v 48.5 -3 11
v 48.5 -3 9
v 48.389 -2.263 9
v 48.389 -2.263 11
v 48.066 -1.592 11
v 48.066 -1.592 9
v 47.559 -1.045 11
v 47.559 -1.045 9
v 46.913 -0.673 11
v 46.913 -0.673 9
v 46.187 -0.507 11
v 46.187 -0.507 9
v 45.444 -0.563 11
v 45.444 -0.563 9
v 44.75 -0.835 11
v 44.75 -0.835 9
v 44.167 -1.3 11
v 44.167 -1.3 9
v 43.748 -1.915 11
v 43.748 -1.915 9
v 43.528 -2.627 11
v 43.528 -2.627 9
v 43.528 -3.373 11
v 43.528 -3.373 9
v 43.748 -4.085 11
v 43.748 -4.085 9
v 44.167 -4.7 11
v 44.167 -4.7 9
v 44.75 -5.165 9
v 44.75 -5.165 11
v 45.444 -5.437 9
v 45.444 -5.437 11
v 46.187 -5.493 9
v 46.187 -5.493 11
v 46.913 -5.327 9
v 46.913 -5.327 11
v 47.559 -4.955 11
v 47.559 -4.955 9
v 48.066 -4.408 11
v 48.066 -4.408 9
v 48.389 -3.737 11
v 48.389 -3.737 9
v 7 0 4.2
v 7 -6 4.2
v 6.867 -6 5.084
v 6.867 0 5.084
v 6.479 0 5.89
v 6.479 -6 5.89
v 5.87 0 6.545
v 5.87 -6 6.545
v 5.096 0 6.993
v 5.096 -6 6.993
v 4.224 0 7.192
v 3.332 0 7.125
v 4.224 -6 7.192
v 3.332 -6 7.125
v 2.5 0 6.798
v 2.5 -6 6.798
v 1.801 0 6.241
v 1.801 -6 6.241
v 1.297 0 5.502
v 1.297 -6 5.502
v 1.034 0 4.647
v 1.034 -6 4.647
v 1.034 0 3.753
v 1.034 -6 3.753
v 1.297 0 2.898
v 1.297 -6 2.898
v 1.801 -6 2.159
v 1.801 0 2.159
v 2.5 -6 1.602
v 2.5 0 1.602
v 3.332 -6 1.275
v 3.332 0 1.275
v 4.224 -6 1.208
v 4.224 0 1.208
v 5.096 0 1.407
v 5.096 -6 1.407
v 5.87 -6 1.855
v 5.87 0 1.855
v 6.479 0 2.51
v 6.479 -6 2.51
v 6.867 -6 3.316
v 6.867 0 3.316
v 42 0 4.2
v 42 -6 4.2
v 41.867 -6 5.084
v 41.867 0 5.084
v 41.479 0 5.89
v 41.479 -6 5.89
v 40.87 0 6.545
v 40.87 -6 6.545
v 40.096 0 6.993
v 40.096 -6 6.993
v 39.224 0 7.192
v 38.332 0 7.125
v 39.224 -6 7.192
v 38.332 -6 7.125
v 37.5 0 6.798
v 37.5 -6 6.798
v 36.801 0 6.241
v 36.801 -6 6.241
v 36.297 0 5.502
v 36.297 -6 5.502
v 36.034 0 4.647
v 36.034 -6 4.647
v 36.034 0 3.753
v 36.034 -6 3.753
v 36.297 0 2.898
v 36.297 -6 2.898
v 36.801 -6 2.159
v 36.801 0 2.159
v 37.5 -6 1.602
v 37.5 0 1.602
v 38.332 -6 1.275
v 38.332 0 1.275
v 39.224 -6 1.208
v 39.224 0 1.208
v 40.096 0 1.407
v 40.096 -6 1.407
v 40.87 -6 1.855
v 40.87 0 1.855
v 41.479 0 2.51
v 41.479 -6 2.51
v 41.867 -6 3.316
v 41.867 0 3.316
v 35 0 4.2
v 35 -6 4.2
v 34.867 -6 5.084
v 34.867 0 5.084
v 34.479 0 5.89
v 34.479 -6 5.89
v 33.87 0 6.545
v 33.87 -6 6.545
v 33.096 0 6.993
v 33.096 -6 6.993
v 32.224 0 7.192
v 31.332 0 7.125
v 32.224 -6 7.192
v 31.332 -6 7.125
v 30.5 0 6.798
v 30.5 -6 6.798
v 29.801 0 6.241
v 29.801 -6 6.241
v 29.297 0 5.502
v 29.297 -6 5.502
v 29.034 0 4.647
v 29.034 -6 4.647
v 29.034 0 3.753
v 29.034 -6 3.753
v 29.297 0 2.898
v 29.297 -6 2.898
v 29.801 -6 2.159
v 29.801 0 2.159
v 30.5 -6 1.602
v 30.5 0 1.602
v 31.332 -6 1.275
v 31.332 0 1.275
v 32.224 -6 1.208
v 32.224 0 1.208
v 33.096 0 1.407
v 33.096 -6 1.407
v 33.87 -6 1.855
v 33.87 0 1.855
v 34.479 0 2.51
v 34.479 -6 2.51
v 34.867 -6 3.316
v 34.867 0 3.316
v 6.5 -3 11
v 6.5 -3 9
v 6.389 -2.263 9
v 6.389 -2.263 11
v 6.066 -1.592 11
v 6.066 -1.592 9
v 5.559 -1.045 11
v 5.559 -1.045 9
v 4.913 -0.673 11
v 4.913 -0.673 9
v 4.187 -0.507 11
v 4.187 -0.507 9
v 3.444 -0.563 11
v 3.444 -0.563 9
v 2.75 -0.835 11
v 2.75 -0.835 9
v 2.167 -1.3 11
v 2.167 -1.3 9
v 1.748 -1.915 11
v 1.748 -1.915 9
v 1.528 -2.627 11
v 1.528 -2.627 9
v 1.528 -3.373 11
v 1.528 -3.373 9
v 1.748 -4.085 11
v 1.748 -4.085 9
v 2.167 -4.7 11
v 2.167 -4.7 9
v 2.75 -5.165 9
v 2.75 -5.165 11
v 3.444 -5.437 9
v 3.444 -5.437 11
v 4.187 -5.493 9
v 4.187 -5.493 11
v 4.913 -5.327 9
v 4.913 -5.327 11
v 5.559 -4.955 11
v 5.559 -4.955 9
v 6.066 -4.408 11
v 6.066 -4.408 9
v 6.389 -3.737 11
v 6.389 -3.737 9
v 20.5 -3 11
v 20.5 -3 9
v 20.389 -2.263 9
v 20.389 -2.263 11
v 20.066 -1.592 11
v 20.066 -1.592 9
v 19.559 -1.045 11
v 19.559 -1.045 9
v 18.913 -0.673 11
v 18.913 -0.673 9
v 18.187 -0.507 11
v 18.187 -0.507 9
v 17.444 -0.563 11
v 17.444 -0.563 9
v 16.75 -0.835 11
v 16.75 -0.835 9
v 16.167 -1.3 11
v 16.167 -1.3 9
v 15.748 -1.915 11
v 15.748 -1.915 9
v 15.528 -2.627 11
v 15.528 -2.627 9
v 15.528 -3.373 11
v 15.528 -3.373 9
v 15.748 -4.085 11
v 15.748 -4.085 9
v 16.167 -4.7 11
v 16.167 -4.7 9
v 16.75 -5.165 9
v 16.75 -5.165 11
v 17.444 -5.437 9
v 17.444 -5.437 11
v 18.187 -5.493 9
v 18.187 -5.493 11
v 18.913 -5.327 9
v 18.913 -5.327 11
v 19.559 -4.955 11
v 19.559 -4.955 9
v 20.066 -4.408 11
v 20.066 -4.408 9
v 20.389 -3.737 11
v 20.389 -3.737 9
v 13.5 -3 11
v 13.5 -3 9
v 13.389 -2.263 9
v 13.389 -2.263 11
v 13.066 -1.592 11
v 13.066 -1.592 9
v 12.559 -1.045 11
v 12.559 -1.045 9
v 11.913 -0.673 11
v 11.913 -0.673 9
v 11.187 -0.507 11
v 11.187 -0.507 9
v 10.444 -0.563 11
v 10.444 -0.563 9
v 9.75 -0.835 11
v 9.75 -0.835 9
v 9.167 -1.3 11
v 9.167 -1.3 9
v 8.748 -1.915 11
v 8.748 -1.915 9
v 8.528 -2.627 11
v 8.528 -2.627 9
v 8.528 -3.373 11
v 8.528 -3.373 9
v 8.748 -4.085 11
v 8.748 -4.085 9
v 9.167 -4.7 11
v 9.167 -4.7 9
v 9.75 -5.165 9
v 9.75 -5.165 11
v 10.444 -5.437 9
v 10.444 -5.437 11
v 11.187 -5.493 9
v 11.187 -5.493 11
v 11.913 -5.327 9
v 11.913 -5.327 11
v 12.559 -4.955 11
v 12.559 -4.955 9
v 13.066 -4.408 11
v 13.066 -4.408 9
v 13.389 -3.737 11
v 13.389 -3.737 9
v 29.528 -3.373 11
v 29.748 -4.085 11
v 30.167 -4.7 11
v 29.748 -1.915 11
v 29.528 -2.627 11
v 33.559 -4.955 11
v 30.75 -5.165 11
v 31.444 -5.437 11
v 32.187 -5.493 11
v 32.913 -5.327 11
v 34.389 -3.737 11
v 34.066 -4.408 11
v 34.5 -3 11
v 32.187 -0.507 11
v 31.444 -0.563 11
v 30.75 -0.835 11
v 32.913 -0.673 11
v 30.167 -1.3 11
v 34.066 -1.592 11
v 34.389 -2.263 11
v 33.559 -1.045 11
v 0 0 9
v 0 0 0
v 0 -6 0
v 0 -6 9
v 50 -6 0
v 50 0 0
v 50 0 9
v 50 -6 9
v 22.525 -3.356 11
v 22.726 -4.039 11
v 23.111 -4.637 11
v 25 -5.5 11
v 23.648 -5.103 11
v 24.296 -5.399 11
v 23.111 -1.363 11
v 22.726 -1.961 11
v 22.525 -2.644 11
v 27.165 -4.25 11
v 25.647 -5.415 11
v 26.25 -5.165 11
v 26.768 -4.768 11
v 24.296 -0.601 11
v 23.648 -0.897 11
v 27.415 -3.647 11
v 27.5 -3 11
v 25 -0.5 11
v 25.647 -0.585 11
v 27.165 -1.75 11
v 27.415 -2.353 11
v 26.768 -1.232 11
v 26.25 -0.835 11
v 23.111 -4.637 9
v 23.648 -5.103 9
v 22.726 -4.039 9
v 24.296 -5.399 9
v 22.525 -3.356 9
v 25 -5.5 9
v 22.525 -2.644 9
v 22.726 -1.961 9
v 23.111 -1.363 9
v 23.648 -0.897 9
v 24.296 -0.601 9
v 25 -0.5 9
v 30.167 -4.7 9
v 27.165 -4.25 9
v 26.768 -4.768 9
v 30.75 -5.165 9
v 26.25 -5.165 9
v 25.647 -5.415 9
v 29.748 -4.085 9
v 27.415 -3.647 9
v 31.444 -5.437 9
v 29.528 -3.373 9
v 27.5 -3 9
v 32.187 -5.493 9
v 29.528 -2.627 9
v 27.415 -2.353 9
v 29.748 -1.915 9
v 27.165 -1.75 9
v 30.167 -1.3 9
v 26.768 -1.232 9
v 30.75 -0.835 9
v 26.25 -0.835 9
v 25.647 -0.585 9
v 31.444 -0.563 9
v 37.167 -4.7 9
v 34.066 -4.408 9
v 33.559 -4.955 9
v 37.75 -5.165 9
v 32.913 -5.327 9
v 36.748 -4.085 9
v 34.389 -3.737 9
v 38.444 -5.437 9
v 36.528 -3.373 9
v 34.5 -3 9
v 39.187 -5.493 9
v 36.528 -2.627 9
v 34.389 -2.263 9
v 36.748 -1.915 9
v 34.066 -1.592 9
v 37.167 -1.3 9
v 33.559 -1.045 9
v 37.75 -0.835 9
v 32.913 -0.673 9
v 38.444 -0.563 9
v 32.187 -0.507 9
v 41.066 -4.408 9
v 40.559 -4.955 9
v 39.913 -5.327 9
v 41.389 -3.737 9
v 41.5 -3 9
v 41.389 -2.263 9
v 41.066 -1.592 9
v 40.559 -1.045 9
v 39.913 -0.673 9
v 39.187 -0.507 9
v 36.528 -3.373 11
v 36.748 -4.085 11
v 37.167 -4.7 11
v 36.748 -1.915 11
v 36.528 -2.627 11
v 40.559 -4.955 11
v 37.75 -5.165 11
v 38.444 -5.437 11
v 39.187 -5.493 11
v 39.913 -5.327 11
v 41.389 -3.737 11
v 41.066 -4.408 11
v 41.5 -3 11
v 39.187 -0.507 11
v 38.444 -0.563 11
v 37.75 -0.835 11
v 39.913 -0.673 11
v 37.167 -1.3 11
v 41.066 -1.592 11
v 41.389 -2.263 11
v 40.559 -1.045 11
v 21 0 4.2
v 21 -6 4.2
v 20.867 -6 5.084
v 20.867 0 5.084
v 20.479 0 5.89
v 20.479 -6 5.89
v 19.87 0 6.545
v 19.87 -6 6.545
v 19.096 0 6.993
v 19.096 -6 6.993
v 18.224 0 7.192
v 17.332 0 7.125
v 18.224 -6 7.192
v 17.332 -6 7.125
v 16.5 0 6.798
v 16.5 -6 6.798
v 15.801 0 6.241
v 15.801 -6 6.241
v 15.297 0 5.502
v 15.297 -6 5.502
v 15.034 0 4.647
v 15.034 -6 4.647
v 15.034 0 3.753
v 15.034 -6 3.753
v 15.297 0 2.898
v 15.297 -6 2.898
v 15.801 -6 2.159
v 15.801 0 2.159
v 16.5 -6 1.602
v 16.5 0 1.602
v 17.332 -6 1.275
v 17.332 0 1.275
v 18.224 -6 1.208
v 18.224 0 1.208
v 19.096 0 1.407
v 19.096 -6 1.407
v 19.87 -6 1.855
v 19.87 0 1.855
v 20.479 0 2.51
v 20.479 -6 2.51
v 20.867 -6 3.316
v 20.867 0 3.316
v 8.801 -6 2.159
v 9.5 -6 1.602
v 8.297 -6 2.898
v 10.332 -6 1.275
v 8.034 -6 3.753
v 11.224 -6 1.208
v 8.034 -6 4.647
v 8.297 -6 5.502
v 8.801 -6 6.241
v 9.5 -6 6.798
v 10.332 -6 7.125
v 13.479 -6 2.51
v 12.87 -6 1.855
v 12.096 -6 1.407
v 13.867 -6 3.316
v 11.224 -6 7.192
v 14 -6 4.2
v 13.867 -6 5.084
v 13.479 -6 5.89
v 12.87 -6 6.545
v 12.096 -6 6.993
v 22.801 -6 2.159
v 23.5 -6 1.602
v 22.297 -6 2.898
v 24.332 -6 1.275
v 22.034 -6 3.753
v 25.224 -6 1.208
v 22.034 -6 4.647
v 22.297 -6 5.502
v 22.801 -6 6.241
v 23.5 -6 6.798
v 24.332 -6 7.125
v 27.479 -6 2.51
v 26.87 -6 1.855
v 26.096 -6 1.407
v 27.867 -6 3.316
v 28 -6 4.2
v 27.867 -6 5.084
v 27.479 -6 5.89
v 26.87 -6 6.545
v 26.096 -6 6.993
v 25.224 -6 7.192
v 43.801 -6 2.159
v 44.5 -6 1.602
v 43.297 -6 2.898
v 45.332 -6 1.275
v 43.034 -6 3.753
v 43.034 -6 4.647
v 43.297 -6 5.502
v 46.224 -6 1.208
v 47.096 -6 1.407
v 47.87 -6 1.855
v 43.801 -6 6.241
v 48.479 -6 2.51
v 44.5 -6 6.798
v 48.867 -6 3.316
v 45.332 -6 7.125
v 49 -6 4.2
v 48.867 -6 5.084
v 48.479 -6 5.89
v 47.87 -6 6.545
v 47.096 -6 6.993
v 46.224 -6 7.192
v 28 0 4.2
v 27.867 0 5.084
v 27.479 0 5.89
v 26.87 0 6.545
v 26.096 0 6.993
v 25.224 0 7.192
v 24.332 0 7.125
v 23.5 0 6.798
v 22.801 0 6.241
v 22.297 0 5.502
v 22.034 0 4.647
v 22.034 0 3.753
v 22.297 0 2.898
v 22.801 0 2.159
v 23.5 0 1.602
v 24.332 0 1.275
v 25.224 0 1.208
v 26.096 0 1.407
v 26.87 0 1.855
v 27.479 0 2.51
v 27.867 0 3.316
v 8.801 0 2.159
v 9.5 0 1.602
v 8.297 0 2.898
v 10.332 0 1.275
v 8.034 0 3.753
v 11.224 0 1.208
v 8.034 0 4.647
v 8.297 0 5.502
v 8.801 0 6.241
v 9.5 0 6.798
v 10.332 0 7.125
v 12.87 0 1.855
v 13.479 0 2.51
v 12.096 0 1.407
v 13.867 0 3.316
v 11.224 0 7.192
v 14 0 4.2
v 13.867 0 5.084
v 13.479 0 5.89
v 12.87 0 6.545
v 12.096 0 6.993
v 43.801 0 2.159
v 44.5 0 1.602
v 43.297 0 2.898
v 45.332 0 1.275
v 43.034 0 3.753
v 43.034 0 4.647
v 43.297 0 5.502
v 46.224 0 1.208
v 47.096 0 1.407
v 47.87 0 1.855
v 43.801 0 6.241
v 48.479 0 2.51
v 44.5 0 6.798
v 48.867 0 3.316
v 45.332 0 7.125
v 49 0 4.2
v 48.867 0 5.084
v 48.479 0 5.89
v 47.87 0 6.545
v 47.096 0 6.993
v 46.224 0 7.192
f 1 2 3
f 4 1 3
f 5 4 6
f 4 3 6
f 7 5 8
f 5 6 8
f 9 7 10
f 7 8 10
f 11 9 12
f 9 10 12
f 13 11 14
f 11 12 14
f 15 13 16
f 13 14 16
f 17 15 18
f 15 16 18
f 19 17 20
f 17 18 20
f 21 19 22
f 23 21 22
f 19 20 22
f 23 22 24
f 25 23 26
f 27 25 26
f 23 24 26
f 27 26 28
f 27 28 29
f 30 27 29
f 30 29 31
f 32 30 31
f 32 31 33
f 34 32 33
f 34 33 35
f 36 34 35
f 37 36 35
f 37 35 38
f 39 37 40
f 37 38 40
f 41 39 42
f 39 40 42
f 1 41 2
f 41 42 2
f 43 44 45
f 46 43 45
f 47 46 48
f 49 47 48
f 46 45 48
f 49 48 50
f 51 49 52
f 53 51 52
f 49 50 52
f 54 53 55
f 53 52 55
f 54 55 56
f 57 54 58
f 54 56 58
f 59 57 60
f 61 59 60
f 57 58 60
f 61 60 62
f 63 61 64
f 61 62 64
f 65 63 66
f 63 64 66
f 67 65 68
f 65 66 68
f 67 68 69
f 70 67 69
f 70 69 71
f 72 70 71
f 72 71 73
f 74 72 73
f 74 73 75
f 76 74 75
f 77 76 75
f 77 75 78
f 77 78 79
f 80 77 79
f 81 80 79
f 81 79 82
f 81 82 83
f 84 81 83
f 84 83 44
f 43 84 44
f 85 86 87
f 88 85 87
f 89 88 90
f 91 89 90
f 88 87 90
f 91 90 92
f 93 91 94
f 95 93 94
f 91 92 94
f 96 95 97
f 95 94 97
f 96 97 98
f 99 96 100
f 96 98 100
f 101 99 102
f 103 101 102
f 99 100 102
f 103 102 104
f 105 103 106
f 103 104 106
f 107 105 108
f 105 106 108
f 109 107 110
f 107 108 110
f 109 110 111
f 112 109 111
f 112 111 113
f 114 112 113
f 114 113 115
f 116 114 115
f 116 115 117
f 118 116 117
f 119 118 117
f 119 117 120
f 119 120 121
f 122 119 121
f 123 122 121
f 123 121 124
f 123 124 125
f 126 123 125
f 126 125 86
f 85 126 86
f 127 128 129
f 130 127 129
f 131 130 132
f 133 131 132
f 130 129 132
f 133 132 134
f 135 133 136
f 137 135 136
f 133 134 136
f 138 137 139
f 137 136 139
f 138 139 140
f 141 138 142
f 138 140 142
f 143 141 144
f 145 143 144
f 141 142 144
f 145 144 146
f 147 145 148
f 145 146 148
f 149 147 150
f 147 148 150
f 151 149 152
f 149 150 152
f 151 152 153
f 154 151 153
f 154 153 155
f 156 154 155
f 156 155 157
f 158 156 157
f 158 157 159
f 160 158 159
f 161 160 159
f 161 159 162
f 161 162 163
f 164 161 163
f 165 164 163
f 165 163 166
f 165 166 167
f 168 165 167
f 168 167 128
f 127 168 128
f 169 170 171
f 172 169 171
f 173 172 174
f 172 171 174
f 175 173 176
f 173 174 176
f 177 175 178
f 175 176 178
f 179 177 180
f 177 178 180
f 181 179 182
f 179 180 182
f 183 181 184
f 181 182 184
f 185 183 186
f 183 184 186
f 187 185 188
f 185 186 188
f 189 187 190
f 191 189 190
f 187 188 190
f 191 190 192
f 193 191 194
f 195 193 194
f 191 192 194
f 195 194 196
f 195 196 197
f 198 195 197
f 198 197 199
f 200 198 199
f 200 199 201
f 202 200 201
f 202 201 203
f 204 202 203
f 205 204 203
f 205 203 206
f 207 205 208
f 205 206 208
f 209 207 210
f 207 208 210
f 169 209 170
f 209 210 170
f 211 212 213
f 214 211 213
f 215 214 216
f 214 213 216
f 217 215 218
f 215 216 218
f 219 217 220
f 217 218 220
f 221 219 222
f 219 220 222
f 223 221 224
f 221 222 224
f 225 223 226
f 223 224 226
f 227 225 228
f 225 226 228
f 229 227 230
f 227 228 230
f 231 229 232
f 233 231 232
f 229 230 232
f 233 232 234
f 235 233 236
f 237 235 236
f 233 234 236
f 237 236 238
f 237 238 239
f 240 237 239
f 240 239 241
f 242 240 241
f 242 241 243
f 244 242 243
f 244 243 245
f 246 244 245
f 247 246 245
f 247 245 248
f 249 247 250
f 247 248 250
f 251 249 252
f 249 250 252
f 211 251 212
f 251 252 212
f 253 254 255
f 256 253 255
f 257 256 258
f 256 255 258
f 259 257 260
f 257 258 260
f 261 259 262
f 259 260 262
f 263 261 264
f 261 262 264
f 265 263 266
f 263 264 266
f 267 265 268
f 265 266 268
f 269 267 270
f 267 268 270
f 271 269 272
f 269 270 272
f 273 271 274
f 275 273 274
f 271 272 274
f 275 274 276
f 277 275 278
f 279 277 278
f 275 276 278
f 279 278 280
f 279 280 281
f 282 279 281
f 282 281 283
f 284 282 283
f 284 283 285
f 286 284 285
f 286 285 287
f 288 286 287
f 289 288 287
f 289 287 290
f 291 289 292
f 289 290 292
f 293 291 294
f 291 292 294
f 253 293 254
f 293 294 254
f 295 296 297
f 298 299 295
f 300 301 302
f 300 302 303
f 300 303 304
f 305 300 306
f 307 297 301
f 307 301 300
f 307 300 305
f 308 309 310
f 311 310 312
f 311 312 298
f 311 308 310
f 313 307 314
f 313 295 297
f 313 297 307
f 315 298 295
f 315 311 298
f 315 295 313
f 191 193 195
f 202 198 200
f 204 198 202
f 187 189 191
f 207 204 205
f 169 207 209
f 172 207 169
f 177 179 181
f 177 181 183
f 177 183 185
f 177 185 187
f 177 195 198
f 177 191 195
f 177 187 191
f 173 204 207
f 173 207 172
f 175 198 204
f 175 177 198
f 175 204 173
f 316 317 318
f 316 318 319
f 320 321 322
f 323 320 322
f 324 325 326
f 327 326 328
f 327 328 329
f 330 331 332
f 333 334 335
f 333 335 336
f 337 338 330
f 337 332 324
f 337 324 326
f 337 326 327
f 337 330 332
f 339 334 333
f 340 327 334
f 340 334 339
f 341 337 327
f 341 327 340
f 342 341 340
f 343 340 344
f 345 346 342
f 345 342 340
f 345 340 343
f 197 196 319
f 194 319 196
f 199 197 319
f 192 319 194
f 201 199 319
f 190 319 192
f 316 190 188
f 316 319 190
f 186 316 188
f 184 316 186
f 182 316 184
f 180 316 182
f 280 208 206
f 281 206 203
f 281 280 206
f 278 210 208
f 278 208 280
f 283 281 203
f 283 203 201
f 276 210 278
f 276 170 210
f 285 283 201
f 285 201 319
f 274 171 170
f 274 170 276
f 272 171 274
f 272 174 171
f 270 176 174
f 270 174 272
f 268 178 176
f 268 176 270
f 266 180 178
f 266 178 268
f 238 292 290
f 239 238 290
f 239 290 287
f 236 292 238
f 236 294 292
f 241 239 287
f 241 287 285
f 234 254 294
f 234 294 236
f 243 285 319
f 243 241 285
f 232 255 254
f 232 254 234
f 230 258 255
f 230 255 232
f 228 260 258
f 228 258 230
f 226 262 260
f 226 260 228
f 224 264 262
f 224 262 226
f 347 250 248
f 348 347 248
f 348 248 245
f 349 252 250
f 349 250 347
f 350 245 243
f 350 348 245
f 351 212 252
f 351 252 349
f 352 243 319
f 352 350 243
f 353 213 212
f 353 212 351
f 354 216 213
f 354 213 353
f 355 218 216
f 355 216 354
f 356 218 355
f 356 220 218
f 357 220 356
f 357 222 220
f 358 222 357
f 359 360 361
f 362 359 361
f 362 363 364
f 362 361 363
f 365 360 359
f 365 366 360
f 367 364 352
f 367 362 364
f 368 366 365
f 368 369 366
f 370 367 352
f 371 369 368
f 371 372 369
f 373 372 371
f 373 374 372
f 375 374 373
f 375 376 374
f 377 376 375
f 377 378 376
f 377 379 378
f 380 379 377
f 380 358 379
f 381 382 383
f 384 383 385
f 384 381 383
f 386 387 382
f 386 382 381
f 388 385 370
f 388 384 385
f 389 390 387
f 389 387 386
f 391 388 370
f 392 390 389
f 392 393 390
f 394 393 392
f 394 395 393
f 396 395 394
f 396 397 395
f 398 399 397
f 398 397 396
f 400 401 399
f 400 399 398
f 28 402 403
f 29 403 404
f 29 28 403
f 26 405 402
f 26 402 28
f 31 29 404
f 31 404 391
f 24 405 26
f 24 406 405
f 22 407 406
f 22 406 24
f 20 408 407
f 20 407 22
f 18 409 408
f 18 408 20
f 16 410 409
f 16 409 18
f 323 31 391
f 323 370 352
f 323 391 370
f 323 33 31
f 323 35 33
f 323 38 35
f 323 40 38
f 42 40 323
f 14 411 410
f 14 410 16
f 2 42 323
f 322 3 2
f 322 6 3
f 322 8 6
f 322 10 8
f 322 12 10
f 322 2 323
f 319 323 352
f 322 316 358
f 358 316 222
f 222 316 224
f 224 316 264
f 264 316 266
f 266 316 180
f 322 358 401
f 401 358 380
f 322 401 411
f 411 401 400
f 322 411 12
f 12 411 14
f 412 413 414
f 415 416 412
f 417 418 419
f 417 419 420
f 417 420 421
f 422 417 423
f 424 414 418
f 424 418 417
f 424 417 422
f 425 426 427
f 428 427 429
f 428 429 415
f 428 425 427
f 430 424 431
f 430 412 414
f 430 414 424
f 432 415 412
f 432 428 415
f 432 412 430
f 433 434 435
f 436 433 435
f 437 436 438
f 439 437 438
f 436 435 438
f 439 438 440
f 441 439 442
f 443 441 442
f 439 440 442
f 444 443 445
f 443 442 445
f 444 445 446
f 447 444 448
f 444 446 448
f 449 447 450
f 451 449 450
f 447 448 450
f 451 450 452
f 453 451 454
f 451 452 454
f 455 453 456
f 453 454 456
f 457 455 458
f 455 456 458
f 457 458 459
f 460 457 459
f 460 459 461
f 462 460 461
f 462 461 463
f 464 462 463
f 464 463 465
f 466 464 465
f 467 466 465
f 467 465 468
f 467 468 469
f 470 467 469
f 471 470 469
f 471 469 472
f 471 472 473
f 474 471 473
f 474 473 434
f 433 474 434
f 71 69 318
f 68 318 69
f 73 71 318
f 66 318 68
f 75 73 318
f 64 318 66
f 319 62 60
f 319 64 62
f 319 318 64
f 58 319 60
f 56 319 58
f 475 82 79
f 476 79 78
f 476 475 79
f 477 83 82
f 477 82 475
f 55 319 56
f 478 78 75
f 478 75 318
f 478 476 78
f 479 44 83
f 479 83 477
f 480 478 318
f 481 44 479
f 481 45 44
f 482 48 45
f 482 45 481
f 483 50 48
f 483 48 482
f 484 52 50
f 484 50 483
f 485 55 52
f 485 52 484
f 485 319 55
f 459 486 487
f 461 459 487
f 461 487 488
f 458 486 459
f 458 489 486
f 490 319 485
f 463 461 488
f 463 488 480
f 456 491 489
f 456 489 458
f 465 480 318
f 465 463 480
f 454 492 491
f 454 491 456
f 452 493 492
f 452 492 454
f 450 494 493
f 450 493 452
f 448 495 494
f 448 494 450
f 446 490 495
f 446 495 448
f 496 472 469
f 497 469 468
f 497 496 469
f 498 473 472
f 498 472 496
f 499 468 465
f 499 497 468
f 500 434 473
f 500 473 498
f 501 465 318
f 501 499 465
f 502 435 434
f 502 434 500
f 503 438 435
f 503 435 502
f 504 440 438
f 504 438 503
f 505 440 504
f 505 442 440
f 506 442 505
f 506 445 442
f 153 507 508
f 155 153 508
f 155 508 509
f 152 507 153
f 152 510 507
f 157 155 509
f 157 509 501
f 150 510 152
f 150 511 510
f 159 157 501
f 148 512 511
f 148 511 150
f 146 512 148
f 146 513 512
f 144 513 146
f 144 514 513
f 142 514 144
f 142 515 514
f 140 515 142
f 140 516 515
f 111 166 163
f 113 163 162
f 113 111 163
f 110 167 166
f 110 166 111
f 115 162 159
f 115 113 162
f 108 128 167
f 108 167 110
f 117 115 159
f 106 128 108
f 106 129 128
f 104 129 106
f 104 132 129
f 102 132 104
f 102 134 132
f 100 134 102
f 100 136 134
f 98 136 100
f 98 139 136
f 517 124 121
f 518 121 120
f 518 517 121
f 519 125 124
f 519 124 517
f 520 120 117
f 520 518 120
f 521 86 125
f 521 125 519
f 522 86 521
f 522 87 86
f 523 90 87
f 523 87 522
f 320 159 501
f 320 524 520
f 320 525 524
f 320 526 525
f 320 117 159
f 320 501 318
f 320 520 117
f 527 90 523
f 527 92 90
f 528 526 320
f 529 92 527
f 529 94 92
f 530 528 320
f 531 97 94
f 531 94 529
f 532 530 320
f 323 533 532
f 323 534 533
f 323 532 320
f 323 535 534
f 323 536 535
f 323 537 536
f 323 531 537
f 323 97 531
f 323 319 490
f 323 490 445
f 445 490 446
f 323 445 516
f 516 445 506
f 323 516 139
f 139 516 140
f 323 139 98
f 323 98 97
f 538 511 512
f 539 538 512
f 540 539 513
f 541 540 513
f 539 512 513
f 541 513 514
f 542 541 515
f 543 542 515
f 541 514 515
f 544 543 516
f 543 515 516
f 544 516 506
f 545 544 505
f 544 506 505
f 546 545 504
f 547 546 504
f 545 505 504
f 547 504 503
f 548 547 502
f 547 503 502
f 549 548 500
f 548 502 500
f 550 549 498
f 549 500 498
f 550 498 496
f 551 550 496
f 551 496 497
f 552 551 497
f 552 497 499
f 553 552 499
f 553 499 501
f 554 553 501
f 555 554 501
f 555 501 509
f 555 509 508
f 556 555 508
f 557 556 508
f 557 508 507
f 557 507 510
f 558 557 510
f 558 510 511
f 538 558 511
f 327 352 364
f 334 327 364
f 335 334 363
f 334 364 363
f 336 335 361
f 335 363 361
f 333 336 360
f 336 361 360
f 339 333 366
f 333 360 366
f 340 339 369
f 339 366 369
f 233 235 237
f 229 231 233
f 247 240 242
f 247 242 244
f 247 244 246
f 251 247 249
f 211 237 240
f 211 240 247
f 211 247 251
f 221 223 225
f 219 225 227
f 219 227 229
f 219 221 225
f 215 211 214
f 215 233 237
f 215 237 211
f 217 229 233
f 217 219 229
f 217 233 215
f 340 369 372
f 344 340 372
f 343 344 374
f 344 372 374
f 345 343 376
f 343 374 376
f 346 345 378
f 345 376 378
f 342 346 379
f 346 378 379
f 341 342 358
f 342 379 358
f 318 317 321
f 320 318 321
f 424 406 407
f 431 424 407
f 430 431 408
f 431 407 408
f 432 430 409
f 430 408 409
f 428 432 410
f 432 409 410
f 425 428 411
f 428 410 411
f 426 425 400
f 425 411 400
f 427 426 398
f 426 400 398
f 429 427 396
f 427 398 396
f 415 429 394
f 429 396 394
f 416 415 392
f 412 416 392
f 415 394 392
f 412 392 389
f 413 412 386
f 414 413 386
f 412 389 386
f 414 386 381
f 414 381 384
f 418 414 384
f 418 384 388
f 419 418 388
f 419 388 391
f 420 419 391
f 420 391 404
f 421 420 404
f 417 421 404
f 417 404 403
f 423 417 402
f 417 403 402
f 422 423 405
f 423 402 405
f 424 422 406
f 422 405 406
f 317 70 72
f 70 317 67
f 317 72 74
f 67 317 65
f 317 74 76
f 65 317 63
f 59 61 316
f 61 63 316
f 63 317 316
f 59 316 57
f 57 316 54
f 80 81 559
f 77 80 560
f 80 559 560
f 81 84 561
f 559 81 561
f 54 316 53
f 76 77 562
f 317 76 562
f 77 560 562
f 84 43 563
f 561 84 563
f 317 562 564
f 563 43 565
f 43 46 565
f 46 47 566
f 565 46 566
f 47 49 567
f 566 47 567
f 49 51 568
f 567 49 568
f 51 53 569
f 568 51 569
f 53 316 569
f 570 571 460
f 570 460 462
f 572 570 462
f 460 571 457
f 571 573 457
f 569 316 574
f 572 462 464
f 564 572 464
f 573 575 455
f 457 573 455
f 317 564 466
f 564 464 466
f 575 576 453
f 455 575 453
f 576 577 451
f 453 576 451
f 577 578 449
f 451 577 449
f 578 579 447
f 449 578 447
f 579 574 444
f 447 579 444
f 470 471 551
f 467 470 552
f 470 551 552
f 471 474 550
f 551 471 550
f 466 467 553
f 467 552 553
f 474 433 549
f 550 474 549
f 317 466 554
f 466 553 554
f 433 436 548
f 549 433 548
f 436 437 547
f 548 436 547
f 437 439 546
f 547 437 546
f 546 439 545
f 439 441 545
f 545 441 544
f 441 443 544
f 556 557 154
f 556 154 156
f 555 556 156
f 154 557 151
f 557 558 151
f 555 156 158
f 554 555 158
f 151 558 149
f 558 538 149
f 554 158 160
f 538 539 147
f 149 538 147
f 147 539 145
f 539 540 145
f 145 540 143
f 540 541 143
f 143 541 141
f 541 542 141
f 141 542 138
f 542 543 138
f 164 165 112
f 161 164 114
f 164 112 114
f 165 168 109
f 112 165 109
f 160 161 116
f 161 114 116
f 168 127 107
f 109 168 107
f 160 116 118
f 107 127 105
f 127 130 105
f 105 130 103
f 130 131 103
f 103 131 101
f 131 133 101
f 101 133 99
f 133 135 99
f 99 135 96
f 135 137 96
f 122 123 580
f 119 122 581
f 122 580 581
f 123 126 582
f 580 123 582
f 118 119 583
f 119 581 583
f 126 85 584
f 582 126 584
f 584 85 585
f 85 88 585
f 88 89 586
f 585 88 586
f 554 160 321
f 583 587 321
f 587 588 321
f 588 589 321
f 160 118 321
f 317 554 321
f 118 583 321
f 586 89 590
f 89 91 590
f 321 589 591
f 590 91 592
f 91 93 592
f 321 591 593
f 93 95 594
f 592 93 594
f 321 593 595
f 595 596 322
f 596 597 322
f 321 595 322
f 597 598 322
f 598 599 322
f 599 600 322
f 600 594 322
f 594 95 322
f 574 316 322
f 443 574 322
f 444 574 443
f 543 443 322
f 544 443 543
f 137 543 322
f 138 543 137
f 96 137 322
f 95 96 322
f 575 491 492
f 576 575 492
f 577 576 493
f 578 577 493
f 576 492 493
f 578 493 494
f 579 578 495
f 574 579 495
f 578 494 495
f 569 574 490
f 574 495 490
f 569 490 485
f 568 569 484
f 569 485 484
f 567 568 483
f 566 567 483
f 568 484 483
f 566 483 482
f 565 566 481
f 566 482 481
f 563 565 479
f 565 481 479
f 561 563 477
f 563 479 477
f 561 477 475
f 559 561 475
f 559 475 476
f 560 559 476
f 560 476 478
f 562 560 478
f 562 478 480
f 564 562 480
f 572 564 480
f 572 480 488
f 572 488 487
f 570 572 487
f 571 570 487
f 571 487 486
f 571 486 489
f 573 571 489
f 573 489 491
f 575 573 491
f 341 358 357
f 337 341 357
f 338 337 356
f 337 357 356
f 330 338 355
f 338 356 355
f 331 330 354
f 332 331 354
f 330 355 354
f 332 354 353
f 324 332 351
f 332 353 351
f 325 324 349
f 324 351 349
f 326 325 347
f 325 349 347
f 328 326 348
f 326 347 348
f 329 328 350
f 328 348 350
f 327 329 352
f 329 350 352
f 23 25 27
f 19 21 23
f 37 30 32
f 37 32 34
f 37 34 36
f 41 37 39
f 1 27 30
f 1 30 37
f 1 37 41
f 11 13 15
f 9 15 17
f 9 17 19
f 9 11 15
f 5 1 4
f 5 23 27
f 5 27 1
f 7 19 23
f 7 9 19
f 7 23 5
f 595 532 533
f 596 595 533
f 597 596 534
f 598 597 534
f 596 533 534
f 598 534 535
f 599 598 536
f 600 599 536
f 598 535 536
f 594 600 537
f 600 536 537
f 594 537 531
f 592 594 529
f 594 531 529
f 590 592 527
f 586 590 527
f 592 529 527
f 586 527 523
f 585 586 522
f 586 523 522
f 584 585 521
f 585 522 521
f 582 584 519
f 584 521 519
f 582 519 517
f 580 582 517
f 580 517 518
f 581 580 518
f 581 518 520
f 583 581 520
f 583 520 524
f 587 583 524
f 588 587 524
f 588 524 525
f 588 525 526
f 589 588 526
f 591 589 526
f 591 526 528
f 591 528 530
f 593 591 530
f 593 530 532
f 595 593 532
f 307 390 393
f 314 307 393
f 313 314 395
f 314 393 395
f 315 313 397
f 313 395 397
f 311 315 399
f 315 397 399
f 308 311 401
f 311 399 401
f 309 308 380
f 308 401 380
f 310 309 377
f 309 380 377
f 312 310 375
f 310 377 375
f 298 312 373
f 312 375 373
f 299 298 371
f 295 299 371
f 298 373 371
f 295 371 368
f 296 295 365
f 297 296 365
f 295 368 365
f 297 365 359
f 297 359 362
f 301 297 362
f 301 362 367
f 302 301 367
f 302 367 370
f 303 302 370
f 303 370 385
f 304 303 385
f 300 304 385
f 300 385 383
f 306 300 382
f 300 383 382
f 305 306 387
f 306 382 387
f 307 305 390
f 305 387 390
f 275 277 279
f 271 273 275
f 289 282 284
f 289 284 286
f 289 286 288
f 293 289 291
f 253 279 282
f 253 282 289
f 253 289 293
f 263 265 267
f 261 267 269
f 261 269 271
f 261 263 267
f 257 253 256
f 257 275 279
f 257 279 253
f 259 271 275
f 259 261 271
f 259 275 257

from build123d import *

# Parameters (mm, degrees)
F0_W     = 50
F0_H     = 9
F1_DEPTH = 6
F2_R     = 3
F3_DEPTH = 25
F4_R     = 2.5
F5_DEPTH = 2


with BuildPart() as f1:
    # F0 (on Front) → F1 (new body)
    with BuildSketch(Plane.XZ):
        with Locations((25, 4.5)):
            Rectangle(F0_W, F0_H)
    extrude(amount=F1_DEPTH)

    # F2 (on face) → F3 (cut)
    with BuildSketch(Plane.XZ.offset(6)):
        with Locations((4, 4.2)):
            Circle(F2_R)
        with Locations((11, 4.2)):
            Circle(F2_R)
        with Locations((18, 4.2)):
            Circle(F2_R)
        with Locations((25, 4.2)):
            Circle(F2_R)
        with Locations((32, 4.2)):
            Circle(F2_R)
        with Locations((39, 4.2)):
            Circle(F2_R)
        with Locations((46, 4.2)):
            Circle(F2_R)
    extrude(amount=-F3_DEPTH, mode=Mode.SUBTRACT)

    # F4 (on face) → F5 (join)
    with BuildSketch(Plane.XY.offset(9)):
        with Locations((4, -3)):
            Circle(F4_R)
        with Locations((11, -3)):
            Circle(F4_R)
        with Locations((18, -3)):
            Circle(F4_R)
        with BuildLine():
            ThreePointArc((27.5, -3), (26.767766953, -1.232233047), (25, -0.5))
            Line((25, -0.5), (25, -5.5))
            ThreePointArc((25, -5.5), (26.767766953, -4.767766953), (27.5, -3))
        make_face()
        with BuildLine():
            Line((25, -5.5), (25, -0.5))
            ThreePointArc((25, -0.5), (22.5, -3), (25, -5.5))
        make_face()
        with Locations((32, -3)):
            Circle(F4_R)
        with Locations((39, -3)):
            Circle(F4_R)
        with Locations((46, -3)):
            Circle(F4_R)
    extrude(amount=F5_DEPTH)


solid = f1.part
